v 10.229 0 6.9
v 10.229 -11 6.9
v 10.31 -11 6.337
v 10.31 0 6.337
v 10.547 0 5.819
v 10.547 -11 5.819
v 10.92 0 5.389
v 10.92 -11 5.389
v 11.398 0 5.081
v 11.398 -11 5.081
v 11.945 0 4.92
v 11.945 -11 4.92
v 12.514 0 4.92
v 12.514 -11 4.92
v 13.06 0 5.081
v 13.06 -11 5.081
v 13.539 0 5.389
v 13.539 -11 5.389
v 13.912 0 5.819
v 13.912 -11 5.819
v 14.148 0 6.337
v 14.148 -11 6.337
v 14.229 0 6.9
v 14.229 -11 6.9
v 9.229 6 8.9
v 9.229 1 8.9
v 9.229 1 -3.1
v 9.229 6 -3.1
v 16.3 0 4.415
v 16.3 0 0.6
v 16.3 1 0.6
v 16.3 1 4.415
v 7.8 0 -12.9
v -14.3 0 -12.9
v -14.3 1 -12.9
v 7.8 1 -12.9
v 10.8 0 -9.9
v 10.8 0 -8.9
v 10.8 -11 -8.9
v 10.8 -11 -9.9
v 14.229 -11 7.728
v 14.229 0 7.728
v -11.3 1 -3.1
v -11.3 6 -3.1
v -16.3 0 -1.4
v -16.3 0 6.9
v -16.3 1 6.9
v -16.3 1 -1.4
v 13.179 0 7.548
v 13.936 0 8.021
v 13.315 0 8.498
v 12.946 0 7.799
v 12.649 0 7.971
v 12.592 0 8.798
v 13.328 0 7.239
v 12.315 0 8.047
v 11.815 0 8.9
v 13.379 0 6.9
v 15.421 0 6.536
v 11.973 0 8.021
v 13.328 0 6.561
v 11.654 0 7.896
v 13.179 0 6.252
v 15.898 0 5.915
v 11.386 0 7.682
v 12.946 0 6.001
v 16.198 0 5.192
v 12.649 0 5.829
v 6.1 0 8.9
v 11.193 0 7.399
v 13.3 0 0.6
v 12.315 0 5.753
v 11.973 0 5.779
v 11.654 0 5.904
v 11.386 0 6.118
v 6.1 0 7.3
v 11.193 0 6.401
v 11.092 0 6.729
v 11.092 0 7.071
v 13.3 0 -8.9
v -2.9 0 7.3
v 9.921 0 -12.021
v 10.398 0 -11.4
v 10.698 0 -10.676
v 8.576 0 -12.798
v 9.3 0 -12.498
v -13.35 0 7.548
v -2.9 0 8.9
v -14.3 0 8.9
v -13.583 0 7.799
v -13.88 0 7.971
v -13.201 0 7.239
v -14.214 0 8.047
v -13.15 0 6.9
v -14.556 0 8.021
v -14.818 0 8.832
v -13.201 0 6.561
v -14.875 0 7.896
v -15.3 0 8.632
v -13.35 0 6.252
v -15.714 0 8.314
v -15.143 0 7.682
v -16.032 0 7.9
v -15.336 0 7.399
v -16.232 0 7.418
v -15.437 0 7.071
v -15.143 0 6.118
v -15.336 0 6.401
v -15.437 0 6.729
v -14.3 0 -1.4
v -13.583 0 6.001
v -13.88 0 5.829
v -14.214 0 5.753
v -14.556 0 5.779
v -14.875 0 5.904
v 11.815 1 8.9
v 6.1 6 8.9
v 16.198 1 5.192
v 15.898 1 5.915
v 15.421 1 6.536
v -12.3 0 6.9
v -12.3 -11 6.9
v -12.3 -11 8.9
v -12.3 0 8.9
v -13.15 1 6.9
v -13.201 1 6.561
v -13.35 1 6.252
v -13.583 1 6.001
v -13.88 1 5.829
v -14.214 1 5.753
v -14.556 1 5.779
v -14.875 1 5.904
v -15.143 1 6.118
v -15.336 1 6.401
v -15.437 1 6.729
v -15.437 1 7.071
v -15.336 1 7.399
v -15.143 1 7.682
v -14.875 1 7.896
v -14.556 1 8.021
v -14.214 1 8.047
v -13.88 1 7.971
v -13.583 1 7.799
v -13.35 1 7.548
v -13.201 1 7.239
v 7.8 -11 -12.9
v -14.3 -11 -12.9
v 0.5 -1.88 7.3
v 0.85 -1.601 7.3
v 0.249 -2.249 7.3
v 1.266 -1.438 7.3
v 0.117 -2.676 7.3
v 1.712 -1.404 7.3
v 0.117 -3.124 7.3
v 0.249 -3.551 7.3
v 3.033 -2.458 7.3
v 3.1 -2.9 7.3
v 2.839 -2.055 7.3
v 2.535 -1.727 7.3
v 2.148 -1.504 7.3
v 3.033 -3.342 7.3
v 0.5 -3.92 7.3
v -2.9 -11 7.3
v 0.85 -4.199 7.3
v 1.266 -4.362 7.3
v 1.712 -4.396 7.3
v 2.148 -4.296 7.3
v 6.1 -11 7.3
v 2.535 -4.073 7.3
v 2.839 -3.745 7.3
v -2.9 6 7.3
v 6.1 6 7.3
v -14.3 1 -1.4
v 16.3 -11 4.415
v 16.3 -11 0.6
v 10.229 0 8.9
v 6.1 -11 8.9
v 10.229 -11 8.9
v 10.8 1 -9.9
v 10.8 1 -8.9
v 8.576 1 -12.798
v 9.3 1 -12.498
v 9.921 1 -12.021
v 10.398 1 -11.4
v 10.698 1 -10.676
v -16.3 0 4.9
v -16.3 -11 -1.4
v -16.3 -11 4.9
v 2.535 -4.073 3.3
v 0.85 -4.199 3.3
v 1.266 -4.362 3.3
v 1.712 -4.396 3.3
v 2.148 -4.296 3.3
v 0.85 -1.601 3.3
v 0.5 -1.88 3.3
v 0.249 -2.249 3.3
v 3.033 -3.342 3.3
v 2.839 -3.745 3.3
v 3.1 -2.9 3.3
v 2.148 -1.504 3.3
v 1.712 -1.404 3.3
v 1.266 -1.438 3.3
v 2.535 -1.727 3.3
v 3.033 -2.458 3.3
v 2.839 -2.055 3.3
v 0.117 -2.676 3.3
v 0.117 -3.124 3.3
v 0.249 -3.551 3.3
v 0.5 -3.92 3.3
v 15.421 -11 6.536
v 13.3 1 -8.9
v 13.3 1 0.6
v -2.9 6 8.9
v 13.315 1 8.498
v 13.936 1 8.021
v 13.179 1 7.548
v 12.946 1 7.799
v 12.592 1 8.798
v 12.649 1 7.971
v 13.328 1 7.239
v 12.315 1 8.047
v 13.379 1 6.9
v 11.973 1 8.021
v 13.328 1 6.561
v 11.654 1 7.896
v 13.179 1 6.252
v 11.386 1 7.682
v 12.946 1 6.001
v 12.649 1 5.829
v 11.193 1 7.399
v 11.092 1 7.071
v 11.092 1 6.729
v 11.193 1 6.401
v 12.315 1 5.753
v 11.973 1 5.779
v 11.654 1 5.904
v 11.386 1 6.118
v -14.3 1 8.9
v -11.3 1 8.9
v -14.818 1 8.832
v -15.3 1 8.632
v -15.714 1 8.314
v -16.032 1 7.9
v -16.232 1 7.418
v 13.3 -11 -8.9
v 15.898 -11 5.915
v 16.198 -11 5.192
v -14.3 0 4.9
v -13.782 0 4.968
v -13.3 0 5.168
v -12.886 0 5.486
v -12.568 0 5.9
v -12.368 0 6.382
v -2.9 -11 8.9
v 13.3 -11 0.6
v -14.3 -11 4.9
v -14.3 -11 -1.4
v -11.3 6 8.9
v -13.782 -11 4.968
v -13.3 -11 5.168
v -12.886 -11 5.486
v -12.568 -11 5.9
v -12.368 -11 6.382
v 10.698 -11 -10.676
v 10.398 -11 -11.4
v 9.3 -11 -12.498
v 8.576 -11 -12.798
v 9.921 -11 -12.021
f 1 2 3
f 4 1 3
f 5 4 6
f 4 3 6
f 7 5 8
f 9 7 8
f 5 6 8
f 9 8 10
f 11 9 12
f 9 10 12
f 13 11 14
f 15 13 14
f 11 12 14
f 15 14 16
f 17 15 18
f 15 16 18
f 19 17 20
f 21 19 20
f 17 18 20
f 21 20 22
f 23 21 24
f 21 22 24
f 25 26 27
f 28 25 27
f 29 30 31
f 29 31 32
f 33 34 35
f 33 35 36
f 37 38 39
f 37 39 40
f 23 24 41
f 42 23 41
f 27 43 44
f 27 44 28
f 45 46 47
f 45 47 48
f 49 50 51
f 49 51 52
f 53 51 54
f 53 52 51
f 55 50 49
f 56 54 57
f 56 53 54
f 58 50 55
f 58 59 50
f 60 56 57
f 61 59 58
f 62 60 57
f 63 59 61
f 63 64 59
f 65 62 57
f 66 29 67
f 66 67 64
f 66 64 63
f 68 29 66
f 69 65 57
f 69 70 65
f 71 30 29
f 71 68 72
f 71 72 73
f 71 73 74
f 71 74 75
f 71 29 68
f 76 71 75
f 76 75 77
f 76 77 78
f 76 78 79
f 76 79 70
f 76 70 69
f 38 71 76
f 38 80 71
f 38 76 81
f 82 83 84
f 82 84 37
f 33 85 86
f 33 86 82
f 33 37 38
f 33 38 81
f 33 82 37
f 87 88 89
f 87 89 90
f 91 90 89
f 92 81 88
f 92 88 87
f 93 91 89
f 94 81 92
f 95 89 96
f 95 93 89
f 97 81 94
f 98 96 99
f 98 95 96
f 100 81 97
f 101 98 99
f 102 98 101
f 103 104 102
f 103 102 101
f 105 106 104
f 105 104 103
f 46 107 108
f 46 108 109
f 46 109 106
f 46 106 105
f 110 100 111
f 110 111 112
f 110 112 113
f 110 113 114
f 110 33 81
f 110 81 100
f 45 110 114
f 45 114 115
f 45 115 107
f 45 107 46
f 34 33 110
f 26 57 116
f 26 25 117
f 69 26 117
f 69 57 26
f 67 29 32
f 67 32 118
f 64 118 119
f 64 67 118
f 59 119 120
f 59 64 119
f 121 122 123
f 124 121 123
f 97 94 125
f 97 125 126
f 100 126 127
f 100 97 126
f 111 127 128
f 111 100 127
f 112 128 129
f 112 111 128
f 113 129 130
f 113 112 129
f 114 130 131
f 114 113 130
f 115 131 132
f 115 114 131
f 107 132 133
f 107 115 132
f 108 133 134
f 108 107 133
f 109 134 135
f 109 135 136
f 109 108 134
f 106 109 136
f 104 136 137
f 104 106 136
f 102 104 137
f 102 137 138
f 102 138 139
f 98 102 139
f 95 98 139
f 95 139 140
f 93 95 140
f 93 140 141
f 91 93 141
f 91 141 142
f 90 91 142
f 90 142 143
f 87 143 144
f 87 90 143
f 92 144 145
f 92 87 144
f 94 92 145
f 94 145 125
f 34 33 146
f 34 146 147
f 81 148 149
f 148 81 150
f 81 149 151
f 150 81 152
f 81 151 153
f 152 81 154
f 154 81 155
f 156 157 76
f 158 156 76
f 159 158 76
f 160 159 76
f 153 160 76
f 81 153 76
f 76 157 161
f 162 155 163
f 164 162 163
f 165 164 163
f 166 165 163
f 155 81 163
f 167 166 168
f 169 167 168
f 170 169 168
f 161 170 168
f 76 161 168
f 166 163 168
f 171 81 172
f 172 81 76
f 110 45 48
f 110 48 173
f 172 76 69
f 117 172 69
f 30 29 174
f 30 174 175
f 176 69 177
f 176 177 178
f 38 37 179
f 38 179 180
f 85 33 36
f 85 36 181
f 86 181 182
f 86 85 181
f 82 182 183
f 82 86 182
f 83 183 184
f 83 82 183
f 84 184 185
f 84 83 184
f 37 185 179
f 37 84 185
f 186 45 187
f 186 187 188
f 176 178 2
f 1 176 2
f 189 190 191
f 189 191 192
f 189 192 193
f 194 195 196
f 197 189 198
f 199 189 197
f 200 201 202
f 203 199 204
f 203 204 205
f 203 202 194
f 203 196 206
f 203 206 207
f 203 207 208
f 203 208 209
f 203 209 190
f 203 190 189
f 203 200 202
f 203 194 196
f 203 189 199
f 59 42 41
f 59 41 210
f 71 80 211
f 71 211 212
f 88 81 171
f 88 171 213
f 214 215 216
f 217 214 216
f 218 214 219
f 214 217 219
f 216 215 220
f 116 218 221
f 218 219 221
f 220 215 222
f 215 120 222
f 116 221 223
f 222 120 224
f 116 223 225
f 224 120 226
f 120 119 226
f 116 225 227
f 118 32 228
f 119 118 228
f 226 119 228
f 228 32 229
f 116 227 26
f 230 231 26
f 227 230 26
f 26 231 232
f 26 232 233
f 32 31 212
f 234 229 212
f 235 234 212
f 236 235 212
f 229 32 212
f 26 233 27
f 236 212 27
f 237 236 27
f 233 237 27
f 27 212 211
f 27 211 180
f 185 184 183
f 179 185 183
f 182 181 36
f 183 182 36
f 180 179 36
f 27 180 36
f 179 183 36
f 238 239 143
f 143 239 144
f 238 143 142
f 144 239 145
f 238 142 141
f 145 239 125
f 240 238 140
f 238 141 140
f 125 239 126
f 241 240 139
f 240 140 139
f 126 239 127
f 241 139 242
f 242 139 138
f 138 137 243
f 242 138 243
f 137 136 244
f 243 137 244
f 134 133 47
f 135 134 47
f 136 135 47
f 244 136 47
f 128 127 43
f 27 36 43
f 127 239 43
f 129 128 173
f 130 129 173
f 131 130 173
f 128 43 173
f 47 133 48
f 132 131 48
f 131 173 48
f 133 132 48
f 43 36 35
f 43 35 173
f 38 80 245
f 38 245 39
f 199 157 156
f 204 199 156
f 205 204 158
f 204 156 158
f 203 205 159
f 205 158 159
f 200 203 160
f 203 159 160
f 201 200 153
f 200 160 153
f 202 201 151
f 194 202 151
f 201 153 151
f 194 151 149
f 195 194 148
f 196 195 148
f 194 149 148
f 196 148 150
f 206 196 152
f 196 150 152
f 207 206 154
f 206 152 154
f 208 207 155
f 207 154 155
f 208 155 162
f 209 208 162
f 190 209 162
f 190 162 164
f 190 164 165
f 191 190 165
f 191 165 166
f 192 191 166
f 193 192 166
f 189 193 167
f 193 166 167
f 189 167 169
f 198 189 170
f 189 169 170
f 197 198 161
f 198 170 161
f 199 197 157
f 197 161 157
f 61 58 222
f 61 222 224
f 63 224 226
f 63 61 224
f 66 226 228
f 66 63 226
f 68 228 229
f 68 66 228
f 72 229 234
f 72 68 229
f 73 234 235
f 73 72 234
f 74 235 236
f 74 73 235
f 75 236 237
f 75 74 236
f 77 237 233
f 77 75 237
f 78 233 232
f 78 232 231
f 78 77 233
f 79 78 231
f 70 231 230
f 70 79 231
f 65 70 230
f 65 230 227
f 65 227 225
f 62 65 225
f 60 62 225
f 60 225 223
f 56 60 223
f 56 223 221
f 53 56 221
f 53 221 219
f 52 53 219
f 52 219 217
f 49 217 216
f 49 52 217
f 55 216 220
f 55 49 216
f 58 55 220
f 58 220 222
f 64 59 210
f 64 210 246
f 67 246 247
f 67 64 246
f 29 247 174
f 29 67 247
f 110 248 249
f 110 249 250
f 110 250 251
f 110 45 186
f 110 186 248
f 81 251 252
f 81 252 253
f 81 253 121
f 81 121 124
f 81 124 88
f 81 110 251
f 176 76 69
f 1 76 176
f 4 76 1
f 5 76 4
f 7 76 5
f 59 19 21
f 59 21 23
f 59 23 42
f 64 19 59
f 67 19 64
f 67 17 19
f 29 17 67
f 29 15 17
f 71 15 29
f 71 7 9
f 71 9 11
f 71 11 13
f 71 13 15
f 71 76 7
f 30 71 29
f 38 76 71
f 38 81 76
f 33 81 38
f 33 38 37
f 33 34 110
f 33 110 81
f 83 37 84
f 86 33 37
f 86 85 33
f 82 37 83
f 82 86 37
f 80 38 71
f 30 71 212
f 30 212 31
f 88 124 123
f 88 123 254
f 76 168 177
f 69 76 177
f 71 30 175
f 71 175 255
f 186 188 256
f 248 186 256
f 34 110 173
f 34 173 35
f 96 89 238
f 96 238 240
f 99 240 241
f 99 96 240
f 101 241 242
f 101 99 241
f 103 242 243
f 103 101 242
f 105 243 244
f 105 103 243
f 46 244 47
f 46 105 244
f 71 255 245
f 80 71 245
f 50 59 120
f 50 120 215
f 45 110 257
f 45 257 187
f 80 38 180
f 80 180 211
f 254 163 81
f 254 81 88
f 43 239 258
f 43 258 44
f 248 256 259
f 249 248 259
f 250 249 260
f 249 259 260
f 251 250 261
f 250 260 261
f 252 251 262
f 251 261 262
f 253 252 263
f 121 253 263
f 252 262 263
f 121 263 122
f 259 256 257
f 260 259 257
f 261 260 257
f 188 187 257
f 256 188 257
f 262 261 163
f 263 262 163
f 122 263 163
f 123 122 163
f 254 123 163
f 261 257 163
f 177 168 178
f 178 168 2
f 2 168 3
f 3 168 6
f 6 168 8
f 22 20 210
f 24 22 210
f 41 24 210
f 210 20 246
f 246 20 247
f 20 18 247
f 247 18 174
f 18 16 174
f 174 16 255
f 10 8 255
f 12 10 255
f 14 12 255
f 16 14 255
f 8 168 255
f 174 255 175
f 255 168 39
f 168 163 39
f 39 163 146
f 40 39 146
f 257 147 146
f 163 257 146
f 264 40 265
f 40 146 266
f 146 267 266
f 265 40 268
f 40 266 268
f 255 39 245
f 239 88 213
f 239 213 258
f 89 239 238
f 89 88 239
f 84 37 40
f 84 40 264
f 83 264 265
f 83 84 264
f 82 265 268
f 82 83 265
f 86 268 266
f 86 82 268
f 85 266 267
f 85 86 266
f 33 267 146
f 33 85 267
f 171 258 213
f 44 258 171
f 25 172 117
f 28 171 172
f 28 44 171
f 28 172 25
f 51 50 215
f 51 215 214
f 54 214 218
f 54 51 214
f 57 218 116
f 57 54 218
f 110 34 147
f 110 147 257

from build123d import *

# Parameters (mm, degrees)
SKETCH_1_R          = 1.15
EXTRUDE_1_DEPTH     = 1
EXTRUDE_2_DEPTH     = 11
CUT_EXTRUDE_1_DEPTH = 11
SKETCH_5_W          = 20.529289322
SKETCH_5_H          = 12
EXTRUDE_3_DEPTH     = 5
SKETCH_6_W          = 9
SKETCH_6_H          = 3.2
CUT_EXTRUDE_2_DEPTH = 18
SKETCH_7_R          = 1.5
CUT_EXTRUDE_3_DEPTH = 4


with BuildPart() as part:
    # 草图1 → 凸台-拉伸1 (new body)
    with BuildSketch(Plane(origin=(0, 0, 0), x_dir=(1, 0, 0), z_dir=(0, 1, 0))):
        with BuildLine():
            Line((-14.3, 8.9), (-14.3, 12.9))
            Line((-14.3, 12.9), (7.8, 12.9))
            ThreePointArc((7.8, 12.9), (9.921320344, 12.021320344), (10.8, 9.9))
            Line((10.8, 9.9), (10.8, 8.9))
            Line((10.8, 8.9), (13.3, 8.9))
            Line((13.3, 8.9), (13.3, -0.6))
            Line((13.3, -0.6), (16.3, -0.6))
            Line((16.3, -0.6), (16.3, -4.41507576))
            ThreePointArc((16.3, -4.41507576), (16.071638598, -5.563126057), (15.421320344, -6.536396103))
            Line((15.421320344, -6.536396103), (13.936396103, -8.021320344))
            ThreePointArc((13.936396103, -8.021320344), (12.963126057, -8.671638598), (11.81507576, -8.9))
            Line((11.81507576, -8.9), (-14.3, -8.9))
            ThreePointArc((-14.3, -8.9), (-15.714213562, -8.314213562), (-16.3, -6.9))
            Line((-16.3, -6.9), (-16.3, 1.4))
            Line((-16.3, 1.4), (-14.3, 1.4))
            Line((-14.3, 1.4), (-14.3, 8.9))
        make_face()
        with Locations((-14.3, -6.9)):
            Circle(SKETCH_1_R, mode=Mode.SUBTRACT)
        with Locations((12.229289322, -6.9)):
            Circle(SKETCH_1_R, mode=Mode.SUBTRACT)
    extrude(amount=EXTRUDE_1_DEPTH)

    # 草图5 → 凸台-拉伸3 (add)
    with BuildSketch(Plane(origin=(0, 1, 0), x_dir=(1, 0, 0), z_dir=(0, 1, 0))):
        with Locations((-1.035355339, -2.9)):
            Rectangle(SKETCH_5_W, SKETCH_5_H)
    extrude(amount=EXTRUDE_3_DEPTH)


with BuildPart() as body_2:
    # 草图2 → 凸台-拉伸2 (new body)
    with BuildSketch(Plane(origin=(0, 0, 0), x_dir=(1, 0, 0), z_dir=(0, 1, 0))):
        with BuildLine():
            Line((-14.3, -8.9), (11.81507576, -8.9))
            ThreePointArc((11.81507576, -8.9), (12.963126057, -8.671638598), (13.936396103, -8.021320344))
            Line((13.936396103, -8.021320344), (15.421320344, -6.536396103))
            ThreePointArc((15.421320344, -6.536396103), (16.071638598, -5.563126057), (16.3, -4.41507576))
            Line((16.3, -4.41507576), (16.3, -0.6))
            Line((16.3, -0.6), (13.3, -0.6))
            Line((13.3, -0.6), (13.3, 8.9))
            Line((13.3, 8.9), (10.8, 8.9))
            Line((10.8, 8.9), (10.8, 9.9))
            ThreePointArc((10.8, 9.9), (9.921320344, 12.021320344), (7.8, 12.9))
            Line((7.8, 12.9), (-14.3, 12.9))
            Line((-14.3, 12.9), (-14.3, 1.4))
            Line((-14.3, 1.4), (-16.3, 1.4))
            Line((-16.3, 1.4), (-16.3, -6.9))
            ThreePointArc((-16.3, -6.9), (-15.714213562, -8.314213562), (-14.3, -8.9))
        make_face()
    extrude(amount=-EXTRUDE_2_DEPTH)

    # 草图4 → 切除-拉伸1 (cut)
    with BuildSketch(Plane.XZ.offset(11)):
        with BuildLine():
            Line((-12.3, 6.9), (-12.3, 8.9))
            Line((-12.3, 8.9), (-14.3, 8.9))
            ThreePointArc((-14.3, 8.9), (-15.714213562, 8.314213562), (-16.3, 6.9))
            Line((-16.3, 6.9), (-16.3, 4.9))
            Line((-16.3, 4.9), (-14.3, 4.9))
            ThreePointArc((-14.3, 4.9), (-12.885786438, 5.485786438), (-12.3, 6.9))
        make_face()
        with BuildLine():
            Line((10.229289322, 8.9), (10.229289322, 6.9))
            ThreePointArc((10.229289322, 6.9), (12.229289322, 4.9), (14.229289322, 6.9))
            Line((14.229289322, 6.9), (14.229289322, 7.728427125))
            Line((14.229289322, 7.728427125), (13.936396103, 8.021320344))
            ThreePointArc((13.936396103, 8.021320344), (12.963126057, 8.671638598), (11.81507576, 8.9))
            Line((11.81507576, 8.9), (10.229289322, 8.9))
        make_face()
    extrude(amount=-CUT_EXTRUDE_1_DEPTH, mode=Mode.SUBTRACT)


with BuildPart() as cut_extrude_2_tool:
    # 草图6 → 切除-拉伸2 (new body, through all)
    with BuildSketch(Plane.XZ.offset(11)):
        with Locations((1.6, 8.9)):
            Rectangle(SKETCH_6_W, SKETCH_6_H)
    extrude(amount=-CUT_EXTRUDE_2_DEPTH)


with BuildPart() as part_1:
    add(part.part)

    # 切除-拉伸2: cut by cut_extrude_2_tool
    add(cut_extrude_2_tool.part, mode=Mode.SUBTRACT)


with BuildPart() as body_2_1:
    add(body_2.part)

    # 切除-拉伸2: cut by cut_extrude_2_tool
    add(cut_extrude_2_tool.part, mode=Mode.SUBTRACT)

    # 草图7 → 切除-拉伸3 (cut)
    with BuildSketch(Plane.XY.offset(7.3)):
        with Locations((1.6, -2.9)):
            Circle(SKETCH_7_R)
    extrude(amount=-CUT_EXTRUDE_3_DEPTH, mode=Mode.SUBTRACT)


solid = Compound([part_1.part, body_2_1.part])
